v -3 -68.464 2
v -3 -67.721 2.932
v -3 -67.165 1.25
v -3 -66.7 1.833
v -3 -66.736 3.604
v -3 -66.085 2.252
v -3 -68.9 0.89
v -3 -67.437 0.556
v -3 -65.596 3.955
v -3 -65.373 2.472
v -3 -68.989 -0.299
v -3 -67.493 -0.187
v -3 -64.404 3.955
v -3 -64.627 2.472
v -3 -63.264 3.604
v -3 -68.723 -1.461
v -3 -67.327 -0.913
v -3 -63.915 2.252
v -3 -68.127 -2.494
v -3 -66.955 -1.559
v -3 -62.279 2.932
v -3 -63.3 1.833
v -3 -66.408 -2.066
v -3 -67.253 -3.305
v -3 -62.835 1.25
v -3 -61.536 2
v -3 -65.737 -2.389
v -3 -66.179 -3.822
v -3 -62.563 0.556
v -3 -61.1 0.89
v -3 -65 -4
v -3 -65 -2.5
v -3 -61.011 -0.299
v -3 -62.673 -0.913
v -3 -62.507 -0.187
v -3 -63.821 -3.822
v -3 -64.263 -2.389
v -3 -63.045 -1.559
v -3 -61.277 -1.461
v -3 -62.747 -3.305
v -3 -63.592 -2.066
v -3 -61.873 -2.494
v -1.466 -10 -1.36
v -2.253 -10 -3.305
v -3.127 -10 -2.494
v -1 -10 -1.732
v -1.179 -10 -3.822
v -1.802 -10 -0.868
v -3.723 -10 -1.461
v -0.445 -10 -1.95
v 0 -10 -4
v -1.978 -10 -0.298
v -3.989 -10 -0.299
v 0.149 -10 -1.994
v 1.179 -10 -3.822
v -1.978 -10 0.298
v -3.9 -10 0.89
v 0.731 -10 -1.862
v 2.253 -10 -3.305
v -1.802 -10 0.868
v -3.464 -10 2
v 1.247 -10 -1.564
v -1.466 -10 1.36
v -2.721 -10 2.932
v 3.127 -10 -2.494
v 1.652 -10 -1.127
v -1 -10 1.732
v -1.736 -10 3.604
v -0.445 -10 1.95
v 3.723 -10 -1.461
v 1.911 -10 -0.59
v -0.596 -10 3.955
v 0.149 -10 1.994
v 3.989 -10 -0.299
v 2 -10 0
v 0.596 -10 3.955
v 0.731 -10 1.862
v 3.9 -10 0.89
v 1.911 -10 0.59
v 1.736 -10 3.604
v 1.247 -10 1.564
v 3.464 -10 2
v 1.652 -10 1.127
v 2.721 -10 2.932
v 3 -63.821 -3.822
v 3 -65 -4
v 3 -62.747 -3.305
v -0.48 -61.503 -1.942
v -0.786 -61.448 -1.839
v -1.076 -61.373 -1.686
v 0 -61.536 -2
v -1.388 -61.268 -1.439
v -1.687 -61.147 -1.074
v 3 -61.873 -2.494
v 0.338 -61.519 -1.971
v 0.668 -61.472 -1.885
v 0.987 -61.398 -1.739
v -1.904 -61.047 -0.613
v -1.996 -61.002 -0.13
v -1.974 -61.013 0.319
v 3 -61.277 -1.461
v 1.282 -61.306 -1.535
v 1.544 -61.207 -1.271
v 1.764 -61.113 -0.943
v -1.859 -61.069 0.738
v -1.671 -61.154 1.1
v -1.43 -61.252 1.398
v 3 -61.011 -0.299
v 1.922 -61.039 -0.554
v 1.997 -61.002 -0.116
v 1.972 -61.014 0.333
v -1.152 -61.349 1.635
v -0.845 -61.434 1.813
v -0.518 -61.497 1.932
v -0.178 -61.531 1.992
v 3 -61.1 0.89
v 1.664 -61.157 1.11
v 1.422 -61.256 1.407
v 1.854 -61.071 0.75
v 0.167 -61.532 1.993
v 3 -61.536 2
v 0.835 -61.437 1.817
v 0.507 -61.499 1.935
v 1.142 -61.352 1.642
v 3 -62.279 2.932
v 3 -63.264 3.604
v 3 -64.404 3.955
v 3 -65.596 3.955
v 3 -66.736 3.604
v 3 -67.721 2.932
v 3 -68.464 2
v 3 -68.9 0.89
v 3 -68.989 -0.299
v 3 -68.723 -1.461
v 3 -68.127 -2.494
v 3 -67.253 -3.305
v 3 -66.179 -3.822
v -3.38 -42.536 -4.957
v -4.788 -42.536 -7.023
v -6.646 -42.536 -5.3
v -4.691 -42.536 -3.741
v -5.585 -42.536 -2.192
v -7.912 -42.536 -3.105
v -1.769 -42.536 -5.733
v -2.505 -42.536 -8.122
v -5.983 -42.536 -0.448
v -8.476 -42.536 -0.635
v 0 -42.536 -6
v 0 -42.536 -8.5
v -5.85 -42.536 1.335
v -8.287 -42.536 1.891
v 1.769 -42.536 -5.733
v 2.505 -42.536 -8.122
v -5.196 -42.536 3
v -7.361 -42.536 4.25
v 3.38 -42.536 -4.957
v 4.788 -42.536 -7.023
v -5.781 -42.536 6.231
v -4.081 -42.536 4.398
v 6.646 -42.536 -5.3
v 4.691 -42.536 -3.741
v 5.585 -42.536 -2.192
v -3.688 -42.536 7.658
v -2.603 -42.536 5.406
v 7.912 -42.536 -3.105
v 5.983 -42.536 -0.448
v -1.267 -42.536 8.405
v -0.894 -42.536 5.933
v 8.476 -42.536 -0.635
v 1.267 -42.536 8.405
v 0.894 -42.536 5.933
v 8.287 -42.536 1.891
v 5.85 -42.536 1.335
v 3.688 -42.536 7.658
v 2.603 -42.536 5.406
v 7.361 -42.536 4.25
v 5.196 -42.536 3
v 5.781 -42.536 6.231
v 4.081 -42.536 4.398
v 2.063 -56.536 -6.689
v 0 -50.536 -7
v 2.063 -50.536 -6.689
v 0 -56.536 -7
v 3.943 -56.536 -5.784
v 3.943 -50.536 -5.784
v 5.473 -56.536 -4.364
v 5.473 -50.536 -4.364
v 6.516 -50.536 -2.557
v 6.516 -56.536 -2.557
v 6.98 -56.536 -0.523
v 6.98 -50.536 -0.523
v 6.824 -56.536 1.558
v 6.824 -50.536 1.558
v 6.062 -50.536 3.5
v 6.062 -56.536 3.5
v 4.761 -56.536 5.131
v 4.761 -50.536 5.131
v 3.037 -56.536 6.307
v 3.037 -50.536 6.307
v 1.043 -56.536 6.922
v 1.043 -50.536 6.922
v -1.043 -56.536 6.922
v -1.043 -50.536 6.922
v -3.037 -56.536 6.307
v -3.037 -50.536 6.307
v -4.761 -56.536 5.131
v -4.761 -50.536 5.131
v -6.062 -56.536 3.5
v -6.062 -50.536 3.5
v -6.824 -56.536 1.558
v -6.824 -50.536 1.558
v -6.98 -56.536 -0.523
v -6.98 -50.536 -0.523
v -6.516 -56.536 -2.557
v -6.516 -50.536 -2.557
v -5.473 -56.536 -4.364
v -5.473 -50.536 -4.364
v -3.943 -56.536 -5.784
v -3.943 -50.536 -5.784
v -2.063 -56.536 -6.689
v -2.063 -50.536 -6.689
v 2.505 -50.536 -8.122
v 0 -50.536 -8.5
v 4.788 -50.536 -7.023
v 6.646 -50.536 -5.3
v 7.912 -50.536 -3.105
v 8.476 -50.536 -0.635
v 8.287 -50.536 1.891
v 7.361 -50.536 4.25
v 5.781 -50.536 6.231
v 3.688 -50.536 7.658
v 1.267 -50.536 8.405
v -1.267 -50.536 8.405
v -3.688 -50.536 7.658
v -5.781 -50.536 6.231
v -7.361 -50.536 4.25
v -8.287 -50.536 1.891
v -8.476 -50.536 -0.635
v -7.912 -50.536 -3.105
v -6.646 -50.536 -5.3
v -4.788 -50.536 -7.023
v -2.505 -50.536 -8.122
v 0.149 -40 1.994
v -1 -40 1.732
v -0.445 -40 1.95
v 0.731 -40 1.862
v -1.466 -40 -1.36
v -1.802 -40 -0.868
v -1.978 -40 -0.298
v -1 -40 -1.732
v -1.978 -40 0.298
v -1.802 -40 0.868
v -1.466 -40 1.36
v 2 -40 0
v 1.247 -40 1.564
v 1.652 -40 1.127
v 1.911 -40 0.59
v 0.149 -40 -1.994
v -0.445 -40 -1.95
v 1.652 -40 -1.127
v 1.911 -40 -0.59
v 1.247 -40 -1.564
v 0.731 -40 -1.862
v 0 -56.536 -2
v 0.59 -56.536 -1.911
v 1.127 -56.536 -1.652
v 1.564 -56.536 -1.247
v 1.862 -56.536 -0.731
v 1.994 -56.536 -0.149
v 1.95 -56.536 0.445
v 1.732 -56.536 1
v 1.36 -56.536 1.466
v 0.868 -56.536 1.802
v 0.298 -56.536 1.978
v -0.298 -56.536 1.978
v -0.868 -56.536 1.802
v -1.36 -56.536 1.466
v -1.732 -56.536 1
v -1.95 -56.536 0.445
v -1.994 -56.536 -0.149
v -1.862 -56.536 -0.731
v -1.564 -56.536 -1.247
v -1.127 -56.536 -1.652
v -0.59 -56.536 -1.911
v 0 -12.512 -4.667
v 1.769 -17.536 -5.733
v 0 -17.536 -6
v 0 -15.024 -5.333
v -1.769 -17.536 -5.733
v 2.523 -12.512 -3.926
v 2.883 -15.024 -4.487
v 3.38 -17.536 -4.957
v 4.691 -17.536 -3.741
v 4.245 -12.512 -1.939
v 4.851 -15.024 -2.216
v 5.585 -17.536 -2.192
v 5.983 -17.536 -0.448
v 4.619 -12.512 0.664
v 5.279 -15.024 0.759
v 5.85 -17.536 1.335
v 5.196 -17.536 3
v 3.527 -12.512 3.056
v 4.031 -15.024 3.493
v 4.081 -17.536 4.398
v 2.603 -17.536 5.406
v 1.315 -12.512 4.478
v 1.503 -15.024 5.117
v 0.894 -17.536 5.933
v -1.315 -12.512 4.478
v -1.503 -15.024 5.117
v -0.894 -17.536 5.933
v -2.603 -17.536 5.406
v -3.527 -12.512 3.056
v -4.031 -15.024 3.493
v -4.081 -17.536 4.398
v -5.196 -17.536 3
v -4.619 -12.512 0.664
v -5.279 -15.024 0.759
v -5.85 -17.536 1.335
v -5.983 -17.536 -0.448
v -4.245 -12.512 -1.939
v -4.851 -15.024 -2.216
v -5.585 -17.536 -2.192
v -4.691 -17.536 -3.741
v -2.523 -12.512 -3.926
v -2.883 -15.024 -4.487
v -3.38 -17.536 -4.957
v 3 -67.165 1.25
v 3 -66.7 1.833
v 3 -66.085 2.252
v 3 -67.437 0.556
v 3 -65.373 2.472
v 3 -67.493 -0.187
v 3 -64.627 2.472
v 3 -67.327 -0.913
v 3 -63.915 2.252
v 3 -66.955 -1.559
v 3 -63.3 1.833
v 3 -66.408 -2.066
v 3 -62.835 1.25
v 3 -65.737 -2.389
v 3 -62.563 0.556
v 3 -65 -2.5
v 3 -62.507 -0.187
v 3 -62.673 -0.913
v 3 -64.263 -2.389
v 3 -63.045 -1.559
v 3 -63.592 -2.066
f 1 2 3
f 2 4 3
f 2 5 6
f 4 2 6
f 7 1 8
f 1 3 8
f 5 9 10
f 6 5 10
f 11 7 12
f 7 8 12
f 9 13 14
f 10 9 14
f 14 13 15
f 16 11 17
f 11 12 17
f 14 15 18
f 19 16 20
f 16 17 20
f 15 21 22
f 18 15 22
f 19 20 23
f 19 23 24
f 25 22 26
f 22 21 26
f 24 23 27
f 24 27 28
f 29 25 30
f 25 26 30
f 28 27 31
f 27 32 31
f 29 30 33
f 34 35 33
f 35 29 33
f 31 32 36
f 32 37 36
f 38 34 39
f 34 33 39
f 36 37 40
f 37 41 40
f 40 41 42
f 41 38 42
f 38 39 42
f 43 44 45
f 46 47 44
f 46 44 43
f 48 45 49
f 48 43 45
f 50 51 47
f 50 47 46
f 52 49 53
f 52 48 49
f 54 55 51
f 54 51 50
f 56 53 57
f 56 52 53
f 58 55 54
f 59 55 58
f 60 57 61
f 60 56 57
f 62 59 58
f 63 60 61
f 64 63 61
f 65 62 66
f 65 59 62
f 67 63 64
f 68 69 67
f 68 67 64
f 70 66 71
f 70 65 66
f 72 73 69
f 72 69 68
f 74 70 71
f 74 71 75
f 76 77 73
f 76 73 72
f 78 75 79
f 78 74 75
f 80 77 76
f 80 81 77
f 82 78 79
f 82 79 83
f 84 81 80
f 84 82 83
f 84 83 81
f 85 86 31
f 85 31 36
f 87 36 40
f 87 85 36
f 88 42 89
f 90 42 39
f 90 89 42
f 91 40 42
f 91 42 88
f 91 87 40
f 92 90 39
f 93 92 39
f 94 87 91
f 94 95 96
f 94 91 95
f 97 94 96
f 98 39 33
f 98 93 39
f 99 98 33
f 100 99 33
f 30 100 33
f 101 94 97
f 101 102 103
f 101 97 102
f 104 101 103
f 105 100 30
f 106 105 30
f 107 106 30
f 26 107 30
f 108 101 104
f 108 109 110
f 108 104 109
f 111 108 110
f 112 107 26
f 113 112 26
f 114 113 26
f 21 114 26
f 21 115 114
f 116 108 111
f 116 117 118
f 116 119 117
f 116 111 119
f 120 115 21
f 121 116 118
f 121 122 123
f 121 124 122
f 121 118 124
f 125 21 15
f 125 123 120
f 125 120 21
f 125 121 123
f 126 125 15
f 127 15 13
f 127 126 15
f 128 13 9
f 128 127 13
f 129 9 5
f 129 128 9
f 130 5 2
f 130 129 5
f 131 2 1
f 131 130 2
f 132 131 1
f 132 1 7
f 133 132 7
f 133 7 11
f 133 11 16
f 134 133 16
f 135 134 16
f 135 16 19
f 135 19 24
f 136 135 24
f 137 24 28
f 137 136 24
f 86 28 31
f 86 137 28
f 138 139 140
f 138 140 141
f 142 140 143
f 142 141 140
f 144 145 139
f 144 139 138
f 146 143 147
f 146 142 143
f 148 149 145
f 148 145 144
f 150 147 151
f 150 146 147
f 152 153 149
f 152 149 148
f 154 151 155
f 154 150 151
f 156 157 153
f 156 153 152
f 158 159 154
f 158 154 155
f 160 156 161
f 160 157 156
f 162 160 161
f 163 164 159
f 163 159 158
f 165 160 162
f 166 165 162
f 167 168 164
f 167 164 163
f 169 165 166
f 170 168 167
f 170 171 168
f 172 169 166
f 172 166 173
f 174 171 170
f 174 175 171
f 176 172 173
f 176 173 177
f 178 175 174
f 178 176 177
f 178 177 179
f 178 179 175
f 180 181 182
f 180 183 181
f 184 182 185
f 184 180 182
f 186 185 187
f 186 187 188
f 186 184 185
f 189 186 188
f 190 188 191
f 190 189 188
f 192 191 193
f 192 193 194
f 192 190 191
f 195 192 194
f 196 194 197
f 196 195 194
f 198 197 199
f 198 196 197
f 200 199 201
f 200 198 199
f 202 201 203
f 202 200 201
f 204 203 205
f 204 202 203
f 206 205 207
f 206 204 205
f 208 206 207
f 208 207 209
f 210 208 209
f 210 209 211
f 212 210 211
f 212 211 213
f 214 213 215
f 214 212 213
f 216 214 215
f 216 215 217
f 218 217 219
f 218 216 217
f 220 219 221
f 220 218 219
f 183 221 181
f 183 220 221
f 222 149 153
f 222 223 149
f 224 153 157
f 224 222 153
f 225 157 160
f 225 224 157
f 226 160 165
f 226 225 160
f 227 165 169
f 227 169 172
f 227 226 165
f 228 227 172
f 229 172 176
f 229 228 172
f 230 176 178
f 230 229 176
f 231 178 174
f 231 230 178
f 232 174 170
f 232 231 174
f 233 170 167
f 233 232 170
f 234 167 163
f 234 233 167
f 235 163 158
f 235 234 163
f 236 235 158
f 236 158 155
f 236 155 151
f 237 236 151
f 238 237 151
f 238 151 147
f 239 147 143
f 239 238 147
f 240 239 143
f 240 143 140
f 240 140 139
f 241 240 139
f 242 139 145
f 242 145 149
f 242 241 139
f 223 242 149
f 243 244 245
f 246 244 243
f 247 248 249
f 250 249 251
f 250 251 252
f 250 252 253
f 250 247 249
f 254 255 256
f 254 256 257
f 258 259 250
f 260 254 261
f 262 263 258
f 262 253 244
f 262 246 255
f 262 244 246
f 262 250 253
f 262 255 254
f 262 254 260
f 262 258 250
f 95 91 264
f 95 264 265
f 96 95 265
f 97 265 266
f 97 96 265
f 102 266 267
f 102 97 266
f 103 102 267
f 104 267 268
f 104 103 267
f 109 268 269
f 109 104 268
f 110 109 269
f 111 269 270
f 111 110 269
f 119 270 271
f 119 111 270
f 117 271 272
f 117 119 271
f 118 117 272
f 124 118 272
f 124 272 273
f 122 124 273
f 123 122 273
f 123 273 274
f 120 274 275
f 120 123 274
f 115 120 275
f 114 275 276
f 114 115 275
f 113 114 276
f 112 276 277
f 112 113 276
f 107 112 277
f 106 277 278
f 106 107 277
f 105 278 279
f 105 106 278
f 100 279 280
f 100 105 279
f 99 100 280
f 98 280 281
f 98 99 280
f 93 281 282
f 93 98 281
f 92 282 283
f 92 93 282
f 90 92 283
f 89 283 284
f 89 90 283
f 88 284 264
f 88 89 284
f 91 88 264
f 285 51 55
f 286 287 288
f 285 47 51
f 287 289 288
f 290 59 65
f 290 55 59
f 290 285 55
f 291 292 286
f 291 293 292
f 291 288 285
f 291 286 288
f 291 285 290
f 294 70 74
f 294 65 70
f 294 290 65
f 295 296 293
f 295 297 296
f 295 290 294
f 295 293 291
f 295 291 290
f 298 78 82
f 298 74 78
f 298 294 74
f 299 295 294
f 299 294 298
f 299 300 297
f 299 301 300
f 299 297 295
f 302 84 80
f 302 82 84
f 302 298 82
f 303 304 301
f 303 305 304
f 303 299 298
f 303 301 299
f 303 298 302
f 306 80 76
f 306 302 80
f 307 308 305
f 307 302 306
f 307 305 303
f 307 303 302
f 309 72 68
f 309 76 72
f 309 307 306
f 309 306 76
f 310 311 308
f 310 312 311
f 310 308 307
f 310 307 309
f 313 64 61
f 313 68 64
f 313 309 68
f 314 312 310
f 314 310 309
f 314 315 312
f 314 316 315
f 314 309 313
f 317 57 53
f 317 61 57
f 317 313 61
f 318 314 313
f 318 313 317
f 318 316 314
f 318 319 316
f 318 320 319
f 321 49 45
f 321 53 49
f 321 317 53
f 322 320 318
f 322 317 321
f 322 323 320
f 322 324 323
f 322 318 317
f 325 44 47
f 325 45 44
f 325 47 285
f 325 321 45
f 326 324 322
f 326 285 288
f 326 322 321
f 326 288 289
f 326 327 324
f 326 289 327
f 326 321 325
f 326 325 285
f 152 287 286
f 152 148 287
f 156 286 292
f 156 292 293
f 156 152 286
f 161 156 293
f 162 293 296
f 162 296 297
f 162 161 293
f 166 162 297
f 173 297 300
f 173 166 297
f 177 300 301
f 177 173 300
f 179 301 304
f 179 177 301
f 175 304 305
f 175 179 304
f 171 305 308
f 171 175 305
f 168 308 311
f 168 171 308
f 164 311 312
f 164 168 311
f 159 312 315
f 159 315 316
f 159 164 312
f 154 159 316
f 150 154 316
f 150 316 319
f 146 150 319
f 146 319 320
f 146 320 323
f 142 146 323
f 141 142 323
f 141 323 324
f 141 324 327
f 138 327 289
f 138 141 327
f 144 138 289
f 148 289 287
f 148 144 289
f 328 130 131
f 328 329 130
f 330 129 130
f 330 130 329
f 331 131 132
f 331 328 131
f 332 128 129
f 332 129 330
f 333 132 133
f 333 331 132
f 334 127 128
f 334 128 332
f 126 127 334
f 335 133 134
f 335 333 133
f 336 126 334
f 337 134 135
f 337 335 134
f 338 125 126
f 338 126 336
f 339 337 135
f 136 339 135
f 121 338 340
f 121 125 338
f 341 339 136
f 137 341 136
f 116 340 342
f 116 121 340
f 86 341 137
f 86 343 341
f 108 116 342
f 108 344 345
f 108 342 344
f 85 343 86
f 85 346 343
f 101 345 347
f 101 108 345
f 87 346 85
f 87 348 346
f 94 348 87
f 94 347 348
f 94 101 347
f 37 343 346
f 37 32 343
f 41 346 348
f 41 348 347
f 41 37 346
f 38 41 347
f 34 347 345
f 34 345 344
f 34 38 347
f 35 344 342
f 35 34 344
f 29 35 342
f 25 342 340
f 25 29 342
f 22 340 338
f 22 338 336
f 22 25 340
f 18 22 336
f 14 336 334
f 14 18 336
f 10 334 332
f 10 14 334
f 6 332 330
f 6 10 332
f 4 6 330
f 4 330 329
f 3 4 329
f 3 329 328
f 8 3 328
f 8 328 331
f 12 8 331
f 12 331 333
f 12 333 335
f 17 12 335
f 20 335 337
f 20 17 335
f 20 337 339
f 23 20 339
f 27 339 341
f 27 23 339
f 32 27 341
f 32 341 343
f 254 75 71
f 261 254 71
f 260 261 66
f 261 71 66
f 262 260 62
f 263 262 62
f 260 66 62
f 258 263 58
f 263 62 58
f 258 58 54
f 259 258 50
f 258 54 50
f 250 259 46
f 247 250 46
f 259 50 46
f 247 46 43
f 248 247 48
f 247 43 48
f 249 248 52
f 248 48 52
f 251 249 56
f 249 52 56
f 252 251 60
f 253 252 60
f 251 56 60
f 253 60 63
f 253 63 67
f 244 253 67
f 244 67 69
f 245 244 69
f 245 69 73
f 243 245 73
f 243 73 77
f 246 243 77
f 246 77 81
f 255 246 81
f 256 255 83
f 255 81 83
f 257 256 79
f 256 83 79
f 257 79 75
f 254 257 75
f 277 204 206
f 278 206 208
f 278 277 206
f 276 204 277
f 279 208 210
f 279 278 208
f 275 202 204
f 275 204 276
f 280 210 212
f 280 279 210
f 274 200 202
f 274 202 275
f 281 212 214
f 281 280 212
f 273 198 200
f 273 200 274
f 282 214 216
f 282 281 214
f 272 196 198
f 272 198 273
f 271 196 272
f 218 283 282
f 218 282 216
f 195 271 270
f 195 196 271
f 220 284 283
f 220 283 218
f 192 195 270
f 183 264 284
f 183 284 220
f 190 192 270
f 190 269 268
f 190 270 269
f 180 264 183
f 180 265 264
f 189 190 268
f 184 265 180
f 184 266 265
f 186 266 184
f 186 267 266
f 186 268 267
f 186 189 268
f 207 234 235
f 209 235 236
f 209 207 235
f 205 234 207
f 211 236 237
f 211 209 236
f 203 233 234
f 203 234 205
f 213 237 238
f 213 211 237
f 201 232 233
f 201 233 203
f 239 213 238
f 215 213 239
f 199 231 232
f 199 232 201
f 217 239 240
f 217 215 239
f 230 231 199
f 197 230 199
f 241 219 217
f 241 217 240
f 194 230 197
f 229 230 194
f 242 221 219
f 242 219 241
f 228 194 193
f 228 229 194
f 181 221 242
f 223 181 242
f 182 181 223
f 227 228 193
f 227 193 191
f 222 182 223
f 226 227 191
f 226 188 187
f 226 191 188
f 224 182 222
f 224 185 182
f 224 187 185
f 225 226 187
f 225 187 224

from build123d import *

# Parameters (mm, degrees)
EXTRUDE_1_DEPTH          = 3
EXTRUDE_1_DEPTH_BACK     = 3
SKETCH_1_R               = 4.5
SKETCH_1_R_2             = 1.5000000000000007
EXTRUDE_1_2_DEPTH        = 3
EXTRUDE_1_2_DEPTH_BACK   = 3
SKETCH_1_R_3             = 4.000000000000001
SKETCH_1_R_4             = 2.500000000000001
EXTRUDE_2_REACH          = 71.212
EXTRUDE_2_END_RADIUS     = 4.5
SKETCH_2_R               = 3
SKETCH_3_R               = 3
CUT_EXTRUDE_1_DEPTH      = 10
SKETCH_4_R               = 2
EXTRUDE_3_DEPTH          = 20
CUT_EXTRUDE_2_DEPTH      = 20
CUT_EXTRUDE_2_DEPTH_BACK = 20
CUT_EXTRUDE_START        = -30
SKETCH_7_R               = 2
CUT_EXTRUDE_3_DEPTH      = 30


with BuildPart() as part:
    # 草图1 → 凸台-拉伸1 (new, two sides: drawn at the far end of the back side and taken through both)
    with BuildSketch(Plane(origin=(0, 0, 0), x_dir=(0, 0, -1), z_dir=(1, 0, 0)).offset(-EXTRUDE_1_DEPTH_BACK)):
        with Locations((0, 20)):
            Circle(SKETCH_1_R)
        with Locations((0, 20)):
            Circle(SKETCH_1_R_2, mode=Mode.SUBTRACT)
    extrude(amount=EXTRUDE_1_DEPTH + EXTRUDE_1_DEPTH_BACK)

    # 凸台-拉伸2: up to this cylinder (the profile starts outside it)
    extrude_2_end = Plane(origin=(0, 20, 0), z_dir=(1, 0, 0)) * Cylinder(EXTRUDE_2_END_RADIUS, 152.424, mode=Mode.PRIVATE)
    # 草图2 → 凸台-拉伸2 (add, up to the surface)
    with BuildSketch(Plane(origin=(0, 0, 0), x_dir=(1, 0, 0), z_dir=(0, 1, 0)), mode=Mode.PRIVATE) as extrude_2_sk1:
        Circle(SKETCH_2_R)
    extrude_2_tool1 = extrude(extrude_2_sk1.sketch, amount=EXTRUDE_2_REACH, mode=Mode.PRIVATE) - extrude_2_end
    add(extrude_2_tool1.solids().sort_by_distance((0, 0, 0))[0])

    # 草图3 → 切除-拉伸1 (cut)
    with BuildSketch(Plane.XZ):
        Circle(SKETCH_3_R)
    extrude(amount=-CUT_EXTRUDE_1_DEPTH, mode=Mode.SUBTRACT)

    # 草图4 → 凸台-拉伸3 (add)
    with BuildSketch(Plane.XZ.offset(-10)):
        Circle(SKETCH_4_R)
    extrude(amount=EXTRUDE_3_DEPTH)



with BuildPart() as body_2:
    # 草图1 → Extrude 1 2 (new, two sides: drawn at the far end of the back side and taken through both)
    with BuildSketch(Plane(origin=(0, 0, 0), x_dir=(0, 0, -1), z_dir=(1, 0, 0)).offset(-EXTRUDE_1_2_DEPTH_BACK)):
        with Locations((1.041e-14, -65)):
            Circle(SKETCH_1_R_3)
        with Locations((1.041e-14, -65)):
            Circle(SKETCH_1_R_4, mode=Mode.SUBTRACT)
    extrude(amount=EXTRUDE_1_2_DEPTH + EXTRUDE_1_2_DEPTH_BACK)


with BuildPart() as part_1:
    add(part.part)

    add(body_2.part)  # 旋转2 merges body 2
    # 草图5 → 旋转2 (revolve)
    with BuildSketch(Plane(origin=(0, 0, 0), x_dir=(0, 0, -1), z_dir=(1, 0, 0))):
        Polygon((0, -10), (4, -10), (6, -17.535898384862247), (6.0000000000000036, -42.53589838486224), (8.500000000000004, -42.53589838486224), (8.500000000000005, -50.53589838486224), (7.000000000000005, -50.53589838486224), (7.000000000000006, -56.53589838486224), (2.0000000000000053, -56.53589838486225), (2.0000000000000067, -61.53589838486224), (1.041e-14, -61), align=None)
    revolve(axis=Axis((0, -10, 0), (0, -1, -2e-16)))

    # 草图6 → 切除-拉伸2 (cut, two sides: drawn at the far end of the back side and taken through both)
    with BuildSketch(Plane(origin=(0, 0, 0), x_dir=(0, 0, -1), z_dir=(1, 0, 0)).offset(-CUT_EXTRUDE_2_DEPTH_BACK)):
        Polygon((4, -9.999999999999998), (-4, -10.000000000000002), (-9.63230113764052, 30.28895780179854), (12.266588859338443, 30.28895780179854), align=None)
    extrude(amount=CUT_EXTRUDE_2_DEPTH + CUT_EXTRUDE_2_DEPTH_BACK, mode=Mode.SUBTRACT)

    # 草图7 → 切除-拉伸3 (cut)
    with BuildSketch(Plane(origin=(0, -10, -2.04e-15), x_dir=(1, 0, 0), z_dir=(0, 1, 2e-16)).offset(CUT_EXTRUDE_START)):
        Circle(SKETCH_7_R)
    extrude(amount=CUT_EXTRUDE_3_DEPTH, mode=Mode.SUBTRACT)


solid = part_1.part
